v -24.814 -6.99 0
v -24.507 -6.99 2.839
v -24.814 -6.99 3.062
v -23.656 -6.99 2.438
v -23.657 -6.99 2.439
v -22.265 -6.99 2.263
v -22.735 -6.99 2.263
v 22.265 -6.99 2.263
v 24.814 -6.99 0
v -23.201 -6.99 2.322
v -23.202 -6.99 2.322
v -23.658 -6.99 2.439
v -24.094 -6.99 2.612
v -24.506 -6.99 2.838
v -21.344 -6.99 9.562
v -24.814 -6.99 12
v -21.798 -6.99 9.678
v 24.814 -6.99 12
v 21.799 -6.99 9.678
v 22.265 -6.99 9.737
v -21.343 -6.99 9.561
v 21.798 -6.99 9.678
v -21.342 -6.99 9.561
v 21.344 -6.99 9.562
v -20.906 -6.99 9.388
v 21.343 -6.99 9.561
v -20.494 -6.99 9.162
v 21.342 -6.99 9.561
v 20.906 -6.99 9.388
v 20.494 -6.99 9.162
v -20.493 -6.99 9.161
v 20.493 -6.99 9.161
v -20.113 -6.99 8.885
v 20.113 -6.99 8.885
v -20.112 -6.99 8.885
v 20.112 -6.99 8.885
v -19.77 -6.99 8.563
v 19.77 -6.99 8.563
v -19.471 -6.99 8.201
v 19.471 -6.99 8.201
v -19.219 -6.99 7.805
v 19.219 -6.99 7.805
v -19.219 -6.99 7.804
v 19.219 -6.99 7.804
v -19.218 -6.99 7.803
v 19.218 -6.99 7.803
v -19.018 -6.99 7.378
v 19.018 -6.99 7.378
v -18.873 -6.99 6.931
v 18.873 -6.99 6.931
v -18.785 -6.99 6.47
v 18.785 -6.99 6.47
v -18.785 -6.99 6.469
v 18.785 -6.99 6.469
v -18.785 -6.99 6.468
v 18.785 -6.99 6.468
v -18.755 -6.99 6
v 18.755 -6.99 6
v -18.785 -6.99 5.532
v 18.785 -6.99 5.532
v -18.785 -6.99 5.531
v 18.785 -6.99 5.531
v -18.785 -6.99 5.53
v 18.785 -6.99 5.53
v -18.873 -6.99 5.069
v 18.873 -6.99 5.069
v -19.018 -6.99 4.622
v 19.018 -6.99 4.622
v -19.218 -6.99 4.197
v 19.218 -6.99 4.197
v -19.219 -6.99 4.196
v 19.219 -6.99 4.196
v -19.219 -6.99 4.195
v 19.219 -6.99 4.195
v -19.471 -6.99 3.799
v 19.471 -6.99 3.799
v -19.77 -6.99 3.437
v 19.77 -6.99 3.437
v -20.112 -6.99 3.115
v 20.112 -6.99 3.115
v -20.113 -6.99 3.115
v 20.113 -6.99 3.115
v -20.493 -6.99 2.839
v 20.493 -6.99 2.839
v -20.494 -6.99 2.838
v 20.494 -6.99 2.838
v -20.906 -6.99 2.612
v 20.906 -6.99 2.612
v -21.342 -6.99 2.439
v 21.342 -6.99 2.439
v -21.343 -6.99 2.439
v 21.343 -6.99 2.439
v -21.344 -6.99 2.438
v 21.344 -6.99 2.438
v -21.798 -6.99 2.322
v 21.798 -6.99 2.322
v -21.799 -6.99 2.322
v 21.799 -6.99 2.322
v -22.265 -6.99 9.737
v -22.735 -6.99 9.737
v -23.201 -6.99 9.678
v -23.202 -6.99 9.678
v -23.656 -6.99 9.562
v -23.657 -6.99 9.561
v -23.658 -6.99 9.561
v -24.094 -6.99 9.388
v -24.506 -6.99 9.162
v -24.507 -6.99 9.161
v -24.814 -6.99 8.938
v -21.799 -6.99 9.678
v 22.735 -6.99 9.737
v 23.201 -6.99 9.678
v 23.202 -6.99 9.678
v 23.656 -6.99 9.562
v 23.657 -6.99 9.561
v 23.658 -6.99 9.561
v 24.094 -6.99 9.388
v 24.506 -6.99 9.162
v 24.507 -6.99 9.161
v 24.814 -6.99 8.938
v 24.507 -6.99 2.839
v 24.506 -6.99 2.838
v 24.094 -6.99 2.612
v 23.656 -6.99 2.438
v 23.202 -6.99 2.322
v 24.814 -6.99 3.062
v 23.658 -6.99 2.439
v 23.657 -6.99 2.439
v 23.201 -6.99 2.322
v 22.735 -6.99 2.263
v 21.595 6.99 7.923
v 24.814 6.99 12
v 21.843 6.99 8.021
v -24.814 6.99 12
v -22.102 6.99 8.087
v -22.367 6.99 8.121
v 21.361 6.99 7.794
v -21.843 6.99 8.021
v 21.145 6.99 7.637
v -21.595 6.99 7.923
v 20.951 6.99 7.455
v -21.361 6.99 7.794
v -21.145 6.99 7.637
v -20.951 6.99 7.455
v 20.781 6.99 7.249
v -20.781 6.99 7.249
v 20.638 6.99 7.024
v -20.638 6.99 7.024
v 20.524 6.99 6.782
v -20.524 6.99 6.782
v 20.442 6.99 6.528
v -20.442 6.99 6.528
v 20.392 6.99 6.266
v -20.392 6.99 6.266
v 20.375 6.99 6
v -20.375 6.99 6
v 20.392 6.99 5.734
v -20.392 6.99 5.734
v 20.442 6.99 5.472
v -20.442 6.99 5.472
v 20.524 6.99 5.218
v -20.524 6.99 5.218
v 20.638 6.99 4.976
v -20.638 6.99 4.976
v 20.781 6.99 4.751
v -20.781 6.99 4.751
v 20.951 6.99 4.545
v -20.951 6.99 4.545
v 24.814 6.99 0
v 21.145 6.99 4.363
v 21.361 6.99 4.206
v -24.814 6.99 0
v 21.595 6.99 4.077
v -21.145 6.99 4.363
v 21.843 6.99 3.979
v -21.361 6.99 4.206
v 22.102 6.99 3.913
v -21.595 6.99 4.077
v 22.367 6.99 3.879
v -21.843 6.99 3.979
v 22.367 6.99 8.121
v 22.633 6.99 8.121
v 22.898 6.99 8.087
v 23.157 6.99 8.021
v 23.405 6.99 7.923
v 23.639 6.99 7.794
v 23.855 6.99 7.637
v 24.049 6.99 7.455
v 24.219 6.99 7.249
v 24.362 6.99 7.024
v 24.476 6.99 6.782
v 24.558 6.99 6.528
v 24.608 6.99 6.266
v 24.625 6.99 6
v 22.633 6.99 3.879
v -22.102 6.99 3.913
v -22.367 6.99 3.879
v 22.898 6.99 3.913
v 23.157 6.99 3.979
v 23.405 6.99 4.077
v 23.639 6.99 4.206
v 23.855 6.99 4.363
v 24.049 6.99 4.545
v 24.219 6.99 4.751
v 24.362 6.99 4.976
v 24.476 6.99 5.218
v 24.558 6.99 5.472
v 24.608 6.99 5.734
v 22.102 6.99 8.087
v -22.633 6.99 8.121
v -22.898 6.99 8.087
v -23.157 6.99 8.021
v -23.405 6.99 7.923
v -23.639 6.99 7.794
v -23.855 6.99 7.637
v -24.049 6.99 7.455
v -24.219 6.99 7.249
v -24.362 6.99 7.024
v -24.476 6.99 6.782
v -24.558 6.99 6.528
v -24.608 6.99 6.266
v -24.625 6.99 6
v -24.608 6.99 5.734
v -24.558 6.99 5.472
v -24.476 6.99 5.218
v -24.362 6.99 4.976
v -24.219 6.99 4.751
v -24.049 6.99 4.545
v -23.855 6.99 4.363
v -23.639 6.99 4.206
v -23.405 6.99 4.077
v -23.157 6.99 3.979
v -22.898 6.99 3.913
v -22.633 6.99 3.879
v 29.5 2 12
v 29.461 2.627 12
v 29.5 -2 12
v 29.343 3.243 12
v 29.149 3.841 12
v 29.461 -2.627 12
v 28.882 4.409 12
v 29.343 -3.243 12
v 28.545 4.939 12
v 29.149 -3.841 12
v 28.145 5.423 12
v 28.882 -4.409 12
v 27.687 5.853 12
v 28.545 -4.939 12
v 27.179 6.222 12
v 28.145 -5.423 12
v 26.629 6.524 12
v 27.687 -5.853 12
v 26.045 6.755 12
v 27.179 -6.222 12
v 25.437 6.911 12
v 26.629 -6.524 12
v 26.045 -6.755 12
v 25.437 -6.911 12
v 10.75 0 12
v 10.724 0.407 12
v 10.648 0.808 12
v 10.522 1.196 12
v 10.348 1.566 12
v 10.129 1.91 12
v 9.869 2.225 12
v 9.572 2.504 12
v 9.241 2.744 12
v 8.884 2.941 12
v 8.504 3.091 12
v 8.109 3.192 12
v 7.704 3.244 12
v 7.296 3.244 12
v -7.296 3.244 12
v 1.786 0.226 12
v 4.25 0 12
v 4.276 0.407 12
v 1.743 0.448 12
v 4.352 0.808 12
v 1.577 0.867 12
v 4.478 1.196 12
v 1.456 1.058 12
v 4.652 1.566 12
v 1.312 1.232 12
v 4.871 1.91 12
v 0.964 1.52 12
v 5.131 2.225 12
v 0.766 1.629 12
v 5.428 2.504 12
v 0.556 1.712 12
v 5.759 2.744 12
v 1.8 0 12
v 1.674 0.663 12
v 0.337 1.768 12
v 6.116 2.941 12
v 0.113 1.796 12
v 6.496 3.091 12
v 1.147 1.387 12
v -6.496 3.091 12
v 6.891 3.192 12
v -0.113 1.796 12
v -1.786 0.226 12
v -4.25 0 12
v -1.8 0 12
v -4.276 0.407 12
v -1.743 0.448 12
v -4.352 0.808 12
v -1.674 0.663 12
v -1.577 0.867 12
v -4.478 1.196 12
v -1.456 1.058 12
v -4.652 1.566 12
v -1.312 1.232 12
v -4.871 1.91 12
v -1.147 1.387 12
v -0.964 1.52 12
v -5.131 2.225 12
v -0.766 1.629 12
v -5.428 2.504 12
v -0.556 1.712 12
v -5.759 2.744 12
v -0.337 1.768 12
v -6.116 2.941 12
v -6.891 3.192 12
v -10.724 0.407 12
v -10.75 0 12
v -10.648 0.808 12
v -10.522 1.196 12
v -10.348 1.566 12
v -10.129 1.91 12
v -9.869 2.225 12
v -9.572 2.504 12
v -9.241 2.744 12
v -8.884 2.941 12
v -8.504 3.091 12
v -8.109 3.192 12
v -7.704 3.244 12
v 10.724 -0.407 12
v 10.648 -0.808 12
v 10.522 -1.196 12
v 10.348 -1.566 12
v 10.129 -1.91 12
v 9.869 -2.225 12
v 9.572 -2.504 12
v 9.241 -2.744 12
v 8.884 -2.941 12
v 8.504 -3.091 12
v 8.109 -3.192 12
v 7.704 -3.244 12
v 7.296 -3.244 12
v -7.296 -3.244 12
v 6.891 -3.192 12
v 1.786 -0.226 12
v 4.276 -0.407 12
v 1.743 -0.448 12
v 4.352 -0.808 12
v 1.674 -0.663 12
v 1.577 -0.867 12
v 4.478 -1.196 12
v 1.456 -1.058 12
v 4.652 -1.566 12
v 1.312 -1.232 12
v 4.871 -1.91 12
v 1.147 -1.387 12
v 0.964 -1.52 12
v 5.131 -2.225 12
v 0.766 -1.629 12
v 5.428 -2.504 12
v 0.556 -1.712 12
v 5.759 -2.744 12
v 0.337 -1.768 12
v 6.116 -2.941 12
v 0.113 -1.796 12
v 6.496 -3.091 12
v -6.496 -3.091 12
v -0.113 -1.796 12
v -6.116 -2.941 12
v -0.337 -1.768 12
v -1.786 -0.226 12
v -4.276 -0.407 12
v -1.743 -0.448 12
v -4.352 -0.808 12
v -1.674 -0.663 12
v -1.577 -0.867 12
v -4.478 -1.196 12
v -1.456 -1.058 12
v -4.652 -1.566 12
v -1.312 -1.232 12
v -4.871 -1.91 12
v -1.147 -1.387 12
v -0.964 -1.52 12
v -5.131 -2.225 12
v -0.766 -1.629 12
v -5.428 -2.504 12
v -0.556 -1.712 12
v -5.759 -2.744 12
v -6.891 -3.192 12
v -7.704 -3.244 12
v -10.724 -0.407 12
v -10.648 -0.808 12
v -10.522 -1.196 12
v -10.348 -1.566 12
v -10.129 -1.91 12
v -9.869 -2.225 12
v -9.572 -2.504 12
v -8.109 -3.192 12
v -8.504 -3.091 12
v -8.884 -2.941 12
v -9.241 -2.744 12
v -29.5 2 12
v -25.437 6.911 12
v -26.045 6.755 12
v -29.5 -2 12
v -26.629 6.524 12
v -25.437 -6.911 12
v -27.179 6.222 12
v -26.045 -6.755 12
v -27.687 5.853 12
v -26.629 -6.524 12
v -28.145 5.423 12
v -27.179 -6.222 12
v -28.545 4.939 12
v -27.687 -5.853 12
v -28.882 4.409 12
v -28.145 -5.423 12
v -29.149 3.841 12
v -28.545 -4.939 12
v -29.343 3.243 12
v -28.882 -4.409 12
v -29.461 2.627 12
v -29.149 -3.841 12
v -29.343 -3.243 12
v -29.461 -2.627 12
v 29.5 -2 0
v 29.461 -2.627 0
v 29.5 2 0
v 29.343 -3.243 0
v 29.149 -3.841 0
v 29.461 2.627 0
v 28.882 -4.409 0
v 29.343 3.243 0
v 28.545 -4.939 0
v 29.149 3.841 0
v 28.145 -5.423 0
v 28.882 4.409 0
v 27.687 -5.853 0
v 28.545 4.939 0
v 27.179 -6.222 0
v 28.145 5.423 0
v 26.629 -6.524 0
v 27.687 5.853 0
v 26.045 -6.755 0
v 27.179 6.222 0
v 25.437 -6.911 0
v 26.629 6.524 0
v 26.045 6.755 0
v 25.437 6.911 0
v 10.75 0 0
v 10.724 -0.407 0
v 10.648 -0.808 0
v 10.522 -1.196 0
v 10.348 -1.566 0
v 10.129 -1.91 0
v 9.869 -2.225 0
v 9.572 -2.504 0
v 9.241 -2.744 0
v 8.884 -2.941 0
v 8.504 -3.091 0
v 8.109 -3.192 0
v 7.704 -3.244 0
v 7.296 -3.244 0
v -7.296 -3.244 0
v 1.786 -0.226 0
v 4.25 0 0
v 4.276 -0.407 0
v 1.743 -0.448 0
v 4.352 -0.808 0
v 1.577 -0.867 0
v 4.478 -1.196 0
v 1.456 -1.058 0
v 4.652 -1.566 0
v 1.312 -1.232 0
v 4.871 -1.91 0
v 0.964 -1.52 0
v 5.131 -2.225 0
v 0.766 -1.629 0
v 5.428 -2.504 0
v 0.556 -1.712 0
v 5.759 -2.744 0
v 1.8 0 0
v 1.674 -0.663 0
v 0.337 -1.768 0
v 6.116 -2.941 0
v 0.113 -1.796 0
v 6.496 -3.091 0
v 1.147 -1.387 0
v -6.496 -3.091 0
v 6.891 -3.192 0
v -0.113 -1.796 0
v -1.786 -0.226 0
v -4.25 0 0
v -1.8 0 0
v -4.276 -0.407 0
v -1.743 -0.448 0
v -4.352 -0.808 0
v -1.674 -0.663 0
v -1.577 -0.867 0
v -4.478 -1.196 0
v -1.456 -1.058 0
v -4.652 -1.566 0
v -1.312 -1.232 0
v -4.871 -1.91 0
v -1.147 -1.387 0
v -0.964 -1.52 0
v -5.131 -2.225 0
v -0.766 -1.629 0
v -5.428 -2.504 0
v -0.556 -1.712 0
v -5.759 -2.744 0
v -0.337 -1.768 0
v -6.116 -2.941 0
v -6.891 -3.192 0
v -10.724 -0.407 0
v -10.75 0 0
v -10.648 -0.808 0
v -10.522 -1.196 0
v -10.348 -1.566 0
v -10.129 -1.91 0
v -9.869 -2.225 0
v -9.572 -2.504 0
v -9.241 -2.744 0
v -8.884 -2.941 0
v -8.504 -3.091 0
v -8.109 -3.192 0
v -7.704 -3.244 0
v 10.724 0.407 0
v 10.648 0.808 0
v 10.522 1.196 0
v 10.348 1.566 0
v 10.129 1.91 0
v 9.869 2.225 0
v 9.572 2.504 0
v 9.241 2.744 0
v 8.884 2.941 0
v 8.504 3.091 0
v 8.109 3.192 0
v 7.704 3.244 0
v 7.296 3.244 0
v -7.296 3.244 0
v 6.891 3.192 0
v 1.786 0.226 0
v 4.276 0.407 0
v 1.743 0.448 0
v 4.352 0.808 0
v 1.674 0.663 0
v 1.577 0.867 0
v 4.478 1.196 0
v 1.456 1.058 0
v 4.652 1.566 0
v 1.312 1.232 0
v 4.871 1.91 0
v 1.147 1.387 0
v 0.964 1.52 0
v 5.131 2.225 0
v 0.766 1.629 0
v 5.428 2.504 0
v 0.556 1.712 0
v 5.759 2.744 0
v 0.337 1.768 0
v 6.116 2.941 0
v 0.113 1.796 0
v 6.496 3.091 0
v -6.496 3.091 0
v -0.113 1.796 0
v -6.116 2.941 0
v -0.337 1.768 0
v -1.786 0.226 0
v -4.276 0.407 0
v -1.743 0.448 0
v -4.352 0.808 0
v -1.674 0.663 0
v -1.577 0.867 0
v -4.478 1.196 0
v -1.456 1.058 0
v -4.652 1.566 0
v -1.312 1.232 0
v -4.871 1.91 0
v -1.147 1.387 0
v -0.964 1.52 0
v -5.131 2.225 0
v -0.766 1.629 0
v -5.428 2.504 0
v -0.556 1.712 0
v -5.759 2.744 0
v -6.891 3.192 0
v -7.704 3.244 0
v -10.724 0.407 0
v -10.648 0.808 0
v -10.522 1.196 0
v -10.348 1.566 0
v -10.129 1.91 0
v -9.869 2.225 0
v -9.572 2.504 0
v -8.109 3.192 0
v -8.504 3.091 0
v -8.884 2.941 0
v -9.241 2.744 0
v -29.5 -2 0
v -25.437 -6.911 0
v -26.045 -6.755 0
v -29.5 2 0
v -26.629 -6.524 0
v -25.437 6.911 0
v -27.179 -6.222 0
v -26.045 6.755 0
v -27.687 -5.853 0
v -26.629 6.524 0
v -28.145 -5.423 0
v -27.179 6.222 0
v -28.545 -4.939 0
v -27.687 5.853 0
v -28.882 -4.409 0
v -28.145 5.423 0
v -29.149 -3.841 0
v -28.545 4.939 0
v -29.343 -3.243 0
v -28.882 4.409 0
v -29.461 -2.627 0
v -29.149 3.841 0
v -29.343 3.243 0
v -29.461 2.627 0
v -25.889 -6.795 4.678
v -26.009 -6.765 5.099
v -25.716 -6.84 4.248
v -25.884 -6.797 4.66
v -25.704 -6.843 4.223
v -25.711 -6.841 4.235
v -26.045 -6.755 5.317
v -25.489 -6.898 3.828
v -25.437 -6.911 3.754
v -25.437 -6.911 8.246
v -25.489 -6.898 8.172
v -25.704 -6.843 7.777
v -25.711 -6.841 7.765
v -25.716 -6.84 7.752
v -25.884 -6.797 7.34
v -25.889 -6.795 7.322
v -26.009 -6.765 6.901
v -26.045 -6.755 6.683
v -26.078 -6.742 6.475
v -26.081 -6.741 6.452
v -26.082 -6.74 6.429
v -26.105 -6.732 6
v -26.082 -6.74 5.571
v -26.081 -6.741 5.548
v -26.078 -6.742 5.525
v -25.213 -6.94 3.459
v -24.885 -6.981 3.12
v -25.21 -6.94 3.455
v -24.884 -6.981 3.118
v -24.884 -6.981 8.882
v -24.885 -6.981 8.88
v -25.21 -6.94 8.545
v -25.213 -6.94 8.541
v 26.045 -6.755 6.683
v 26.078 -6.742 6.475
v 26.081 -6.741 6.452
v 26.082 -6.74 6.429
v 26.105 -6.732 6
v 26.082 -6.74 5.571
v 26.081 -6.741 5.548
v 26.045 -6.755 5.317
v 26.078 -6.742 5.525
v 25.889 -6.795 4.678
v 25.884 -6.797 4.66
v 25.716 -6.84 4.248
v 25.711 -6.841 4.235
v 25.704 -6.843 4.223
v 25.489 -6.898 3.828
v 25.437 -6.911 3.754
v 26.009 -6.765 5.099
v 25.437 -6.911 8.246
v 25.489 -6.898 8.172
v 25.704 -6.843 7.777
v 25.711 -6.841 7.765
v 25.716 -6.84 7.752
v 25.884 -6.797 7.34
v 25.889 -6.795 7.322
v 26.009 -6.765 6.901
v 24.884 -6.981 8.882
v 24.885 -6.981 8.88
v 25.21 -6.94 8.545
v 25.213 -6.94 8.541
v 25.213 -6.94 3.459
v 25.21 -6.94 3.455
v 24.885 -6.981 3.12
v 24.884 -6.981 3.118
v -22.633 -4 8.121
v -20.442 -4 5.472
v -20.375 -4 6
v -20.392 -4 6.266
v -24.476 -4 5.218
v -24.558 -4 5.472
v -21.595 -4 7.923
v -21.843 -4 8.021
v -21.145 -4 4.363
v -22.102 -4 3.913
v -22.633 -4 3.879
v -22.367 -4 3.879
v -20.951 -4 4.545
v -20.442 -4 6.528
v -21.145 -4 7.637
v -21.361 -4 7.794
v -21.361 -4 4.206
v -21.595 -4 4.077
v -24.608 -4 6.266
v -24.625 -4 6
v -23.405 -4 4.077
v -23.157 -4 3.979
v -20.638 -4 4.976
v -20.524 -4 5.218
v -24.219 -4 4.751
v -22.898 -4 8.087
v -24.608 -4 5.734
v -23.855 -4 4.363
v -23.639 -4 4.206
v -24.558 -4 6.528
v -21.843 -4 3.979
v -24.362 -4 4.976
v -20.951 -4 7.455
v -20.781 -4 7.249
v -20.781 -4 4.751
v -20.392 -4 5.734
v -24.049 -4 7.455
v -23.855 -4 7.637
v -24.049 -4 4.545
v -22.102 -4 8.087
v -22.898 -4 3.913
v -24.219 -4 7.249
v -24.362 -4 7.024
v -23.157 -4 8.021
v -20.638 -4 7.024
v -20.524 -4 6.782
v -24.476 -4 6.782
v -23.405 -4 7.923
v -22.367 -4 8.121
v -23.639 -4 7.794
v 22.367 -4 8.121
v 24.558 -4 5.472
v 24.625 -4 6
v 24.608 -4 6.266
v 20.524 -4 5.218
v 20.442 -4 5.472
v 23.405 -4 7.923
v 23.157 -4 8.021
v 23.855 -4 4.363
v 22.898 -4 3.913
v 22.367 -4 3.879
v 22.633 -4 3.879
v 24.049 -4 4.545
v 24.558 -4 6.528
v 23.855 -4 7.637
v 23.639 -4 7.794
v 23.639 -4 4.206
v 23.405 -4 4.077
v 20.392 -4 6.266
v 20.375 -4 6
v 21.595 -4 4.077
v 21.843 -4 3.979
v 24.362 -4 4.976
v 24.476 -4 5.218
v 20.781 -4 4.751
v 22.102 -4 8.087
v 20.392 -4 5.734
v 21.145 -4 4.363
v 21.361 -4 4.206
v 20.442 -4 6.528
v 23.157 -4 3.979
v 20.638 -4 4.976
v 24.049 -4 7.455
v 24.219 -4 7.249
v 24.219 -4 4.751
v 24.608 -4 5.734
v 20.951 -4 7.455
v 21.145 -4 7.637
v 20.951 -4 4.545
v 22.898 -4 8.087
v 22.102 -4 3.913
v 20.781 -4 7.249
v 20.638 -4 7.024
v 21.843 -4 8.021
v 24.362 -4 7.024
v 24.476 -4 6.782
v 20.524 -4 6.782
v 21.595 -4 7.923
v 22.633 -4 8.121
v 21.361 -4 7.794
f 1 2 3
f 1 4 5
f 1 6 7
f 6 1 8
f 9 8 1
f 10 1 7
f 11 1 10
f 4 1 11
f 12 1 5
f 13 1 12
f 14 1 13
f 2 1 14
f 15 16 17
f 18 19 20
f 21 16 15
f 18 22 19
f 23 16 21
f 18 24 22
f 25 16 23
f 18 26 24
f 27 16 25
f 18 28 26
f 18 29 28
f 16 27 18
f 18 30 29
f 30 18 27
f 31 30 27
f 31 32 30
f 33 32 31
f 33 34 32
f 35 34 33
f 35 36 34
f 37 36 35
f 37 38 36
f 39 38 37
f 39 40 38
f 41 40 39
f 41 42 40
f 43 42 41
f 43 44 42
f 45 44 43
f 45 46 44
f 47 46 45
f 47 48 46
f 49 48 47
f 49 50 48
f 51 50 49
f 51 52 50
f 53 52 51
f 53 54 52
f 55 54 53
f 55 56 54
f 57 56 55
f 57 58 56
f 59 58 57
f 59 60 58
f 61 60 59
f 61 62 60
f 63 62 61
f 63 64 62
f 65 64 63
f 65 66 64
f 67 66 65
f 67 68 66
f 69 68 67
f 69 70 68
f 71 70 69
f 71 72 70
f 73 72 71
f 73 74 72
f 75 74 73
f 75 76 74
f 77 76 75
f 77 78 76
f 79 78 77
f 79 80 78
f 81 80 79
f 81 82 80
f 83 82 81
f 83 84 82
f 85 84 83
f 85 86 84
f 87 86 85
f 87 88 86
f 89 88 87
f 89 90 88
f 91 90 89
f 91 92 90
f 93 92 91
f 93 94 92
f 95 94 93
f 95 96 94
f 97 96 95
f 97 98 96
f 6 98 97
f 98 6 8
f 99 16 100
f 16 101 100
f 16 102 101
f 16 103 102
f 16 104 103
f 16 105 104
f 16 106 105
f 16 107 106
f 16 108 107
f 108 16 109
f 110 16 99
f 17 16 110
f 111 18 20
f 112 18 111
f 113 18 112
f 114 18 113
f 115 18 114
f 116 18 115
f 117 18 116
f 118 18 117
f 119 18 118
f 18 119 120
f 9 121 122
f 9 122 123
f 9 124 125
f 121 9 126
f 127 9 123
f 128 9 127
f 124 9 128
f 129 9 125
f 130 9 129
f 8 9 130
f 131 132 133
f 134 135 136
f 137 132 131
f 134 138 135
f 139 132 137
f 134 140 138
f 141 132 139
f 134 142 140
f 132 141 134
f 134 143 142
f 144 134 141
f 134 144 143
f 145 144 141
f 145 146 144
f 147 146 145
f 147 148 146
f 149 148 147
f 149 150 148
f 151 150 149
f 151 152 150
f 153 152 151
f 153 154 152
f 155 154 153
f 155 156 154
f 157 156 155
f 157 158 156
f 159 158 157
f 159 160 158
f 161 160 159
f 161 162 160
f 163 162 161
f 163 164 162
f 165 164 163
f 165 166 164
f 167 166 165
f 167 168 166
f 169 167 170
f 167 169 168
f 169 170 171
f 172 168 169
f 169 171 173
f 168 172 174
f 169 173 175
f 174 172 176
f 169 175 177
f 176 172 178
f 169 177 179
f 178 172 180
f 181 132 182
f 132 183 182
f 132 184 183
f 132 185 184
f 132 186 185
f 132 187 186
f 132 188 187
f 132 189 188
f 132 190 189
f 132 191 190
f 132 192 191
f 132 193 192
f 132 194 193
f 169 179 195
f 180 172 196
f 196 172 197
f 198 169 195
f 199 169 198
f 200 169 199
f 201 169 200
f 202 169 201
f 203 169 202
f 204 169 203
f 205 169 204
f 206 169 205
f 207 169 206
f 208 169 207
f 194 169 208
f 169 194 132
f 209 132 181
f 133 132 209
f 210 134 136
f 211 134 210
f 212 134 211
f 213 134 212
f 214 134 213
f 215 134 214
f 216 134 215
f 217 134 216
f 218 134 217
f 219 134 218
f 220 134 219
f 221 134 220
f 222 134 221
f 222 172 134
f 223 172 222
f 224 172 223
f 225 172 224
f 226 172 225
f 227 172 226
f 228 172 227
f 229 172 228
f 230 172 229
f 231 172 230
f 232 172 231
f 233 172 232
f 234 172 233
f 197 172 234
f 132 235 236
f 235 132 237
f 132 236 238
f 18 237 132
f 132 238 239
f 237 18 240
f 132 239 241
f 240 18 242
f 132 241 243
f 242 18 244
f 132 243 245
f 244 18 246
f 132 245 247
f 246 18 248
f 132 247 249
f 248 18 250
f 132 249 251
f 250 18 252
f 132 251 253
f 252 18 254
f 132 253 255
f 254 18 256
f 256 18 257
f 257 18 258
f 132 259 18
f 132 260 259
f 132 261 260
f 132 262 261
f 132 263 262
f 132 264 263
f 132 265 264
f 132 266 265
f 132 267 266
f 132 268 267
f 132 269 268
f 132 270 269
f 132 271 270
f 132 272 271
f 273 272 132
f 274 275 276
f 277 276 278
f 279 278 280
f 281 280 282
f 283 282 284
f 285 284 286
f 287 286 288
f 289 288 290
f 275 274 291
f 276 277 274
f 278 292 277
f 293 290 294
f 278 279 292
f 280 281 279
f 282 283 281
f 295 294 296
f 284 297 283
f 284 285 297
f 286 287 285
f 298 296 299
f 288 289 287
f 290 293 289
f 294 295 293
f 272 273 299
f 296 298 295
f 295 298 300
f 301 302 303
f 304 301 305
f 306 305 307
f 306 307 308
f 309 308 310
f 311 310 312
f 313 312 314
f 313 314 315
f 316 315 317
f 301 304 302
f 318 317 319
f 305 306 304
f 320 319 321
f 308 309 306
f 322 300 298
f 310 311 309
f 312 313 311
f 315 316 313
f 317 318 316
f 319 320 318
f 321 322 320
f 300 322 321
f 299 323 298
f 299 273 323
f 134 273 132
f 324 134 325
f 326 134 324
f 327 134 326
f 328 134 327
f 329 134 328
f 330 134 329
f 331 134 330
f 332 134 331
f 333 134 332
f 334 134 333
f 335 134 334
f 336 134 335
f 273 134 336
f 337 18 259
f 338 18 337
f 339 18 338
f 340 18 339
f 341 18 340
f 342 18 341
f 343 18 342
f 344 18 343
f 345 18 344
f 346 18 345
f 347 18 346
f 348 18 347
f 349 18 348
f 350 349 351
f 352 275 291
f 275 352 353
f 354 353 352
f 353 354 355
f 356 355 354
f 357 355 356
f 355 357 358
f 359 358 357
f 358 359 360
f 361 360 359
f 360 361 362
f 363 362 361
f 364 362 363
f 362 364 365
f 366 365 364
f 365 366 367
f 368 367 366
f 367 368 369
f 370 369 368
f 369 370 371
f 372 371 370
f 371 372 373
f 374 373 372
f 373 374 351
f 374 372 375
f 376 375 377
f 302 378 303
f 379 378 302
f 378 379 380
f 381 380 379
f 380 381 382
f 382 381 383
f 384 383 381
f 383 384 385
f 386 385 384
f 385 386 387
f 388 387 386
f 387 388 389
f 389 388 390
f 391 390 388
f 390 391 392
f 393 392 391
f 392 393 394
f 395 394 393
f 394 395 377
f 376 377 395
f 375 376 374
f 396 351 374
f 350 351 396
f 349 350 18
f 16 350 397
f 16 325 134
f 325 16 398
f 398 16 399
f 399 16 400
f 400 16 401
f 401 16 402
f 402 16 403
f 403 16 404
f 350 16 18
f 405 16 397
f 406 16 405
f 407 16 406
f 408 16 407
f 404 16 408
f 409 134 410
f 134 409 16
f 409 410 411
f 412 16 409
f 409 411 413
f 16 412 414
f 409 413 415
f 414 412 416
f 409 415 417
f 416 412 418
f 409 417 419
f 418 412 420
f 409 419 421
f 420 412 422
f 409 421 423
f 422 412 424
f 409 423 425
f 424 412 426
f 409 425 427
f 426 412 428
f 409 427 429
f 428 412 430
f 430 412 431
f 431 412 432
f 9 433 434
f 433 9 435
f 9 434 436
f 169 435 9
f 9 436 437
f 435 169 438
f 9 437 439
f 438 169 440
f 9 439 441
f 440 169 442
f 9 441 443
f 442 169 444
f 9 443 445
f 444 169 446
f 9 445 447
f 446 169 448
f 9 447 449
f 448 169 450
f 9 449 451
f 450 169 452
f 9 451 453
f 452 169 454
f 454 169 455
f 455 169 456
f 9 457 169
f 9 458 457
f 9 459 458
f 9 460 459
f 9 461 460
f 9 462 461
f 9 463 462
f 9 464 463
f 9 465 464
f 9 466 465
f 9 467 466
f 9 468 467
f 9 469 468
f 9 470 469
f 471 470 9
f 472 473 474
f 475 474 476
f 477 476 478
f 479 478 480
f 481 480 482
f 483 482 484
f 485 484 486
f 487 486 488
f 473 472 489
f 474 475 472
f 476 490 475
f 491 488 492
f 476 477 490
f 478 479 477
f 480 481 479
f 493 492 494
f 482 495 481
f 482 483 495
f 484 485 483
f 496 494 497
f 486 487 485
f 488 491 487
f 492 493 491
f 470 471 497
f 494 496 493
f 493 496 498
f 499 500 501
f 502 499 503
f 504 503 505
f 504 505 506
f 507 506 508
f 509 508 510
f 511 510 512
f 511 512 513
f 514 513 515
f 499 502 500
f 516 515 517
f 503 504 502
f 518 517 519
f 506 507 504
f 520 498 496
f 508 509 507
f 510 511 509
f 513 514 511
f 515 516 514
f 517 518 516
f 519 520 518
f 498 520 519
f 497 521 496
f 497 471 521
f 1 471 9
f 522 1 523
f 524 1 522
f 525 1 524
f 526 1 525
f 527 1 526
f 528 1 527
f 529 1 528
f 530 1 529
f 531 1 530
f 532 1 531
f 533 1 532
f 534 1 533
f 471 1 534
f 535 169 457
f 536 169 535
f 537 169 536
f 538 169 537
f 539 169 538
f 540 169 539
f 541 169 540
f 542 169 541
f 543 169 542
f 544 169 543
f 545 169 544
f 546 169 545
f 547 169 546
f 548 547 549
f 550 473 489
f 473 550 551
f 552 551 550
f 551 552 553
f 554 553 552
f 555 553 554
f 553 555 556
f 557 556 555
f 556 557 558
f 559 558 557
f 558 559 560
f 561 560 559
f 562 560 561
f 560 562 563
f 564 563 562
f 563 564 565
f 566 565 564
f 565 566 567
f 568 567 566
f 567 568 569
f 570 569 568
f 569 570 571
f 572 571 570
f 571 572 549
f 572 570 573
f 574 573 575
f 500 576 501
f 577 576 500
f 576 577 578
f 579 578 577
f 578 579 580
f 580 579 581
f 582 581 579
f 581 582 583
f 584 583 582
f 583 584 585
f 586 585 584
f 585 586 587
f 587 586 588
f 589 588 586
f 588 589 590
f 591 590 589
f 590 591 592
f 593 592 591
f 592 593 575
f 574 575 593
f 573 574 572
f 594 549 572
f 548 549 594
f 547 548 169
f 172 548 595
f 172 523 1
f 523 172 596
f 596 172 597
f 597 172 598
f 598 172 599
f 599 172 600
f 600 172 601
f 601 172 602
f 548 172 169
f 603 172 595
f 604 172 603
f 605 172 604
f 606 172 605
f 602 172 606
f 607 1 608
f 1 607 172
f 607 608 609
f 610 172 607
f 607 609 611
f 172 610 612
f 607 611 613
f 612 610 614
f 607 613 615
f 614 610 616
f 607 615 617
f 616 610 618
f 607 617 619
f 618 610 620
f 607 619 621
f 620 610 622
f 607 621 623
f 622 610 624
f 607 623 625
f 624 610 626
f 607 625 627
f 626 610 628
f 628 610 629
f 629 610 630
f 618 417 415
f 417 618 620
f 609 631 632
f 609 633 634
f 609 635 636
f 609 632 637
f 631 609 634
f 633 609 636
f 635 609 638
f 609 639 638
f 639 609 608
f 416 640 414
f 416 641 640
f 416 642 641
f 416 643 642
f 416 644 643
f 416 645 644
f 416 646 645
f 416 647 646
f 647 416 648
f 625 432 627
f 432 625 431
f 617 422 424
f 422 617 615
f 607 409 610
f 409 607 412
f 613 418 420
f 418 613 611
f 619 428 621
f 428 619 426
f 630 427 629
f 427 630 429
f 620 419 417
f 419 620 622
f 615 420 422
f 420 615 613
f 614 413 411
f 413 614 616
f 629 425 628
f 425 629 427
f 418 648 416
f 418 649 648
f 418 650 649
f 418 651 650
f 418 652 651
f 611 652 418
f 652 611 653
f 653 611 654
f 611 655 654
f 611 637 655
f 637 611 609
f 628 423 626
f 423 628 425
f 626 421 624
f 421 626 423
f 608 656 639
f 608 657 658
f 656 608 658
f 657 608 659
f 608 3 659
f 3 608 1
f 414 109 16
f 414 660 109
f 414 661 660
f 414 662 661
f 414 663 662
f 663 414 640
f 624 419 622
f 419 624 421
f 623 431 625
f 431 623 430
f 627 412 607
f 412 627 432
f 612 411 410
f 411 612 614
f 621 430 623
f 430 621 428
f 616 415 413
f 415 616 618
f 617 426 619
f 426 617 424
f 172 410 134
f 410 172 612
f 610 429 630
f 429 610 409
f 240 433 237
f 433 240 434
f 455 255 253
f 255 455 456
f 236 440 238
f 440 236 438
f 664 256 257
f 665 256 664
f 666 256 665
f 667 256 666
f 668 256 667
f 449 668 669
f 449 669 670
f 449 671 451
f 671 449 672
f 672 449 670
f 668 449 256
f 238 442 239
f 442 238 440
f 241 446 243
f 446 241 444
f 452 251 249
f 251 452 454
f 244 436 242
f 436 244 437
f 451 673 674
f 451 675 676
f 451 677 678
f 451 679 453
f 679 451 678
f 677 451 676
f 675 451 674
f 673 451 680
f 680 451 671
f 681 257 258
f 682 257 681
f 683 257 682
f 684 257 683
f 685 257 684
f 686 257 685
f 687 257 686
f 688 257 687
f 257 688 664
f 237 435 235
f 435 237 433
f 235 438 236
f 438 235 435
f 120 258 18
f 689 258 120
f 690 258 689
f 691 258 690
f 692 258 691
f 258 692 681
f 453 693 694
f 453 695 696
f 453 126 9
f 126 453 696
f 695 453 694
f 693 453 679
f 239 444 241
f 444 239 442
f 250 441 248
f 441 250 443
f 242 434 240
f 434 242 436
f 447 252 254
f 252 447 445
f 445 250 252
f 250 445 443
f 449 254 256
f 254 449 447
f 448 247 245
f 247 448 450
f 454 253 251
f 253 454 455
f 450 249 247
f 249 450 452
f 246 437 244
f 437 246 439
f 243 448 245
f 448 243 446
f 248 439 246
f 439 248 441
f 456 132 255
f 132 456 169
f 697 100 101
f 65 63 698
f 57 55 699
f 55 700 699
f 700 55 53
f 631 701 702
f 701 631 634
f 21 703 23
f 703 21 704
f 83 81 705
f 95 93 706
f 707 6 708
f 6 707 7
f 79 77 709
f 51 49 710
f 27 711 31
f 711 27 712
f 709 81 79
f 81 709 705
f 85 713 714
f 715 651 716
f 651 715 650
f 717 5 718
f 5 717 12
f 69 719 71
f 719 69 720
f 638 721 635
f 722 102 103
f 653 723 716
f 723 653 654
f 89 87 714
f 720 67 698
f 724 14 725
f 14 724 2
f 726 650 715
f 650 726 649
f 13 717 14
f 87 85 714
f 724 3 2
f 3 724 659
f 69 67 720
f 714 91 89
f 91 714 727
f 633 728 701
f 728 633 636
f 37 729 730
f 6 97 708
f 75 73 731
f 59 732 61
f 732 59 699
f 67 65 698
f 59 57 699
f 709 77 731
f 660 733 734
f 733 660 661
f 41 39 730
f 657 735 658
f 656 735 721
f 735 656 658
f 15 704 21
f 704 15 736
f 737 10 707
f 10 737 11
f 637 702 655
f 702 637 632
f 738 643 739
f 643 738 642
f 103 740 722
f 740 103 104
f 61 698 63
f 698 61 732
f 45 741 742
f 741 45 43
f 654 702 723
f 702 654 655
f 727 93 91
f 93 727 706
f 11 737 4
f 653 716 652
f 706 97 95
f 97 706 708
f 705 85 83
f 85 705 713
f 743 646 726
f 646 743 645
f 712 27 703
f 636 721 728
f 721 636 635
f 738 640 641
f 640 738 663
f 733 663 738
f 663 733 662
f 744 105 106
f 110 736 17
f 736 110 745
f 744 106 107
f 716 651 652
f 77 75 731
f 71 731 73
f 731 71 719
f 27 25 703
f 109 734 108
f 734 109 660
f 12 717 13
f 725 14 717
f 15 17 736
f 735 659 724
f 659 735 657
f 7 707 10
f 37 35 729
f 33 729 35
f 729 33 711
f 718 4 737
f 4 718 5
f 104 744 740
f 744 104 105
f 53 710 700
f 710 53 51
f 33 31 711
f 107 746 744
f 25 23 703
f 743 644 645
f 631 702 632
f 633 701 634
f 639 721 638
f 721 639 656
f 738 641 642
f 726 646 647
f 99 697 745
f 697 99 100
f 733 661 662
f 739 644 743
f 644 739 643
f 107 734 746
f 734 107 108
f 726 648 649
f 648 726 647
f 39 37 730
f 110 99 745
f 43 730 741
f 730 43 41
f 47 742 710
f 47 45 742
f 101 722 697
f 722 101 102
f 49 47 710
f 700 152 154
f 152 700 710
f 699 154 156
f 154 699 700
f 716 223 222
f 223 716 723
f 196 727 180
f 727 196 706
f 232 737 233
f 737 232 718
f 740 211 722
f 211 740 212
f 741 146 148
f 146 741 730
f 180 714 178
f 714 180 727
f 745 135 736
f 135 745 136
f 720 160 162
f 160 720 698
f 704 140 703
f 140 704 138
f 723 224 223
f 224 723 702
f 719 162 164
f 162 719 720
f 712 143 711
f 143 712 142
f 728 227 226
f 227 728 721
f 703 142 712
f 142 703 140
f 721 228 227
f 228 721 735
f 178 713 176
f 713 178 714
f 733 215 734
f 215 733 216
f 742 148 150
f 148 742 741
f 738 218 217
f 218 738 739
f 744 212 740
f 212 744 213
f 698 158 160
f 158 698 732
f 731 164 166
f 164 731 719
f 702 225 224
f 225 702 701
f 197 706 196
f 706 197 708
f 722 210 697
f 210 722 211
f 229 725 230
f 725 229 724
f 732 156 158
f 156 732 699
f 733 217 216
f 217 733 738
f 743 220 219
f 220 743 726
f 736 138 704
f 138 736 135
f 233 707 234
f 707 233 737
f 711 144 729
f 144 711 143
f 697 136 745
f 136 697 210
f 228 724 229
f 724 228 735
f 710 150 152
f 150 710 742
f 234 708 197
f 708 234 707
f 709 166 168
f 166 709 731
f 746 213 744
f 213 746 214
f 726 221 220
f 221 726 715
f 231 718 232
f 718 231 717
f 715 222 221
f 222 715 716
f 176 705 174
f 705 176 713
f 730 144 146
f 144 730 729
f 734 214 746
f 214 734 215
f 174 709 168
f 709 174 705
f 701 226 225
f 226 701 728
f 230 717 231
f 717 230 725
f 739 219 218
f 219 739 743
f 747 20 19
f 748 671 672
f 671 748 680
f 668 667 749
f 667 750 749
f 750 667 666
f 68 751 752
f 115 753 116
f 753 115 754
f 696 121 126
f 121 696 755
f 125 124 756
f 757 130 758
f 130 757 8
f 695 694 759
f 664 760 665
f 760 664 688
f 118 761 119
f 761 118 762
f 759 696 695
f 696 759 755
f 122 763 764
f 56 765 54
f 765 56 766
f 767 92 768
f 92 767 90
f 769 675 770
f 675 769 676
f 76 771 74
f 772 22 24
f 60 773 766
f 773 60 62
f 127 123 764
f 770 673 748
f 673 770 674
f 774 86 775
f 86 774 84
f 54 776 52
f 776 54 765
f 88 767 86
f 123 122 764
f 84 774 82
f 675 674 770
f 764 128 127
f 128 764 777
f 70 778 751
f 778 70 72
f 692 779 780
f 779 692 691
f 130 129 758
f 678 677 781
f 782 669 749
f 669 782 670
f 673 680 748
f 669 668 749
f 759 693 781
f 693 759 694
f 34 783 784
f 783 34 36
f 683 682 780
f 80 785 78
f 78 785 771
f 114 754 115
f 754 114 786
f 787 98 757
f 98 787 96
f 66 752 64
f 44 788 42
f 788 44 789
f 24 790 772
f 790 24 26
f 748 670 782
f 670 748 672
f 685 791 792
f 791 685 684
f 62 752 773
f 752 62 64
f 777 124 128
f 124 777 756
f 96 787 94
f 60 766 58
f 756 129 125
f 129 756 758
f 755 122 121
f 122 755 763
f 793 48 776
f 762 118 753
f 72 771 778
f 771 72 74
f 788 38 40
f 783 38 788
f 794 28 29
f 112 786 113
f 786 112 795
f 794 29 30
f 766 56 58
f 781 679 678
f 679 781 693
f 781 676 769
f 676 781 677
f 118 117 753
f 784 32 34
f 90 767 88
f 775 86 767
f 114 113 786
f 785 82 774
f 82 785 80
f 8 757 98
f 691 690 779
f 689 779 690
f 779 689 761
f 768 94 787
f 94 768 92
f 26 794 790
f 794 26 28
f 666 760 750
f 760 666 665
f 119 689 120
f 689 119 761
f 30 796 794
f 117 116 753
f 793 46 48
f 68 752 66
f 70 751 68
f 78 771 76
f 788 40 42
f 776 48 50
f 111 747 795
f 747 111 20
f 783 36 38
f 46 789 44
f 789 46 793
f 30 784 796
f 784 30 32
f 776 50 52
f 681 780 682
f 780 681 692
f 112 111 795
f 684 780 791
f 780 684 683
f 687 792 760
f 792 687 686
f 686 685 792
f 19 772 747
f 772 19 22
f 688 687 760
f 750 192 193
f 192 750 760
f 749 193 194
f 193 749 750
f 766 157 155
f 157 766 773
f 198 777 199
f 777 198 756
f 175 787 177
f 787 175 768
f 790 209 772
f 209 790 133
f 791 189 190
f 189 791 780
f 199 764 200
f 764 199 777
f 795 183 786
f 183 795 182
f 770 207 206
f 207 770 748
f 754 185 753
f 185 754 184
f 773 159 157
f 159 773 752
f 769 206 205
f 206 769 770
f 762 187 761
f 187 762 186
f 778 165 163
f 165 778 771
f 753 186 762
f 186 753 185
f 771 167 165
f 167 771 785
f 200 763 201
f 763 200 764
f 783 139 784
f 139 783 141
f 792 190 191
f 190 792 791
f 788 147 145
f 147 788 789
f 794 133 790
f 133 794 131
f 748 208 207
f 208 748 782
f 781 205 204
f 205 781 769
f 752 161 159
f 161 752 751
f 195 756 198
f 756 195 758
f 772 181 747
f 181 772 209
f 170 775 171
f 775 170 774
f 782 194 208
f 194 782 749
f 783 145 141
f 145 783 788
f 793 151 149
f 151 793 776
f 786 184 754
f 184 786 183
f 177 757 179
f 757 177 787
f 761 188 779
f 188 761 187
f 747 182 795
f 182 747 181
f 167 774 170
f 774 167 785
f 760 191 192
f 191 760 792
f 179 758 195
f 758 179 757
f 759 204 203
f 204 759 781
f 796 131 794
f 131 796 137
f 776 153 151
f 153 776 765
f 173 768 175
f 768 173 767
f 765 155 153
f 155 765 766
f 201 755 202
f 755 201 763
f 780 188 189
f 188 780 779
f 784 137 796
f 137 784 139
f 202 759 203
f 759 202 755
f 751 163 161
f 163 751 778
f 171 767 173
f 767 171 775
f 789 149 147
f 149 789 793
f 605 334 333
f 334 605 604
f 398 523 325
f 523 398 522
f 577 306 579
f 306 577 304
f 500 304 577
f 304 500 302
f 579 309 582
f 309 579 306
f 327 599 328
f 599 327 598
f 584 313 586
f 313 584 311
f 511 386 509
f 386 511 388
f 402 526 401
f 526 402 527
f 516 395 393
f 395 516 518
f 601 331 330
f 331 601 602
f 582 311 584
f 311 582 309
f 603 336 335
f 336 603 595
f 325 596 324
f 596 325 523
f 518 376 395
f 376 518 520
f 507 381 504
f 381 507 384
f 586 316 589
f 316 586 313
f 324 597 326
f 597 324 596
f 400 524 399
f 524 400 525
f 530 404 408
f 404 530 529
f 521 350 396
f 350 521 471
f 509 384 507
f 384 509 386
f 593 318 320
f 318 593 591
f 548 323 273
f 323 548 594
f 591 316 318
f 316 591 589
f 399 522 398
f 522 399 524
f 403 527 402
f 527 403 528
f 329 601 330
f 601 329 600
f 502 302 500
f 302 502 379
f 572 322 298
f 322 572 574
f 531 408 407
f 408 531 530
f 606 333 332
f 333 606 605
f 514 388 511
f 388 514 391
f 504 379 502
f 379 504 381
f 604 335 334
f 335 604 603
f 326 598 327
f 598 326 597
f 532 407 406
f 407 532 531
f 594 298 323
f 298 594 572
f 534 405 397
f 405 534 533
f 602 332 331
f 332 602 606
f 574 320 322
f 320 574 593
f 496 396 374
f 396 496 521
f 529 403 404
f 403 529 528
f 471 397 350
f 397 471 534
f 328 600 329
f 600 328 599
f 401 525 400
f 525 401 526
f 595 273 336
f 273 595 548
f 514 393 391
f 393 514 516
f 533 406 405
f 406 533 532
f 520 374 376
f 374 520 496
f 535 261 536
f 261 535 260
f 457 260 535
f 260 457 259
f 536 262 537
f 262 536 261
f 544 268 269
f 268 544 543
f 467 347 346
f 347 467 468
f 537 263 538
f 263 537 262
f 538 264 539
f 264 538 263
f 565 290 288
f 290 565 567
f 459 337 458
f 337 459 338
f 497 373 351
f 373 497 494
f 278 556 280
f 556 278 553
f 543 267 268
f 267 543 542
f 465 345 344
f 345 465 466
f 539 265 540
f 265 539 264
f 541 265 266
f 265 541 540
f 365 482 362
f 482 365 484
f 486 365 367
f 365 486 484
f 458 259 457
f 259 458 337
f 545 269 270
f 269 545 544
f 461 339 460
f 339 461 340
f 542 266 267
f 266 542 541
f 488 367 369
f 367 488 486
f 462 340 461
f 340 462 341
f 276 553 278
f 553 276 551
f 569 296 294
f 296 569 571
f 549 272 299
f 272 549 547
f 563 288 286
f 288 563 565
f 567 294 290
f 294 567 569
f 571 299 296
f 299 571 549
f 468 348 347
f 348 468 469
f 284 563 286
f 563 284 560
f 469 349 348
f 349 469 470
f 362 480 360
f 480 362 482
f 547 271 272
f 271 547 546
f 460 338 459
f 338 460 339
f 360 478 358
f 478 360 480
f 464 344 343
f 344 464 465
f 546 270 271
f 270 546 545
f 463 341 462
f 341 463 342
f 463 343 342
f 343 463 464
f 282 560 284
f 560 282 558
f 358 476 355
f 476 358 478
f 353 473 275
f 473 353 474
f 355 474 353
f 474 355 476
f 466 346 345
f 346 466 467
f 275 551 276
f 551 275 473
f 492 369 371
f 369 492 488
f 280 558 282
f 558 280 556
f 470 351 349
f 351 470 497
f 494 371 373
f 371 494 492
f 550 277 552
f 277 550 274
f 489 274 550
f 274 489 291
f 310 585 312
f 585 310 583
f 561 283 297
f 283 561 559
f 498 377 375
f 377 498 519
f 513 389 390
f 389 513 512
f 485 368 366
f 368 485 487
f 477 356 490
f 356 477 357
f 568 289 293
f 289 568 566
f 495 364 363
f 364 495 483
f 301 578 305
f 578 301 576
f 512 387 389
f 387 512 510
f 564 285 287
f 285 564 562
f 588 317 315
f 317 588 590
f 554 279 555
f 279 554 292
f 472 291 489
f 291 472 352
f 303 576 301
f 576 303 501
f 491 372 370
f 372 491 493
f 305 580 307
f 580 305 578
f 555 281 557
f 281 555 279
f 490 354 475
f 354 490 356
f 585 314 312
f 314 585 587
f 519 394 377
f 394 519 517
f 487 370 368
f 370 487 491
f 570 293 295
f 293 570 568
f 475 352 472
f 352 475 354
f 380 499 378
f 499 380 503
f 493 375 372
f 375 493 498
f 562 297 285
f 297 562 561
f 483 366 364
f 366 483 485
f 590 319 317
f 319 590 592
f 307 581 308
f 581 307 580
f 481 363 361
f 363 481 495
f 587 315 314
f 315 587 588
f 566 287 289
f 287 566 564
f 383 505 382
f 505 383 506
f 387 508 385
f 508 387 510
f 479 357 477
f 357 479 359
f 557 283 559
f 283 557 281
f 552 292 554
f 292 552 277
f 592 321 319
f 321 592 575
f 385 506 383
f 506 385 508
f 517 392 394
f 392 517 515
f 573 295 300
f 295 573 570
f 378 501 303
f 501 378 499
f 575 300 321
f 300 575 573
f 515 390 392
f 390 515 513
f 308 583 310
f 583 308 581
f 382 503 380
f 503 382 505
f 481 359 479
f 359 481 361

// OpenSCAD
$fn = 50;


difference() {
	union() {
		hull() {
			translate(v = [-9.5000000000, 2.0000000000, 0]) {
				cylinder(h = 12, r = 5);
			}
			translate(v = [9.5000000000, 2.0000000000, 0]) {
				cylinder(h = 12, r = 5);
			}
			translate(v = [-9.5000000000, -2.0000000000, 0]) {
				cylinder(h = 12, r = 5);
			}
			translate(v = [9.5000000000, -2.0000000000, 0]) {
				cylinder(h = 12, r = 5);
			}
		}
		translate(v = [-15.0000000000, 0.0000000000, 0]) {
			hull() {
				translate(v = [-9.5000000000, 2.0000000000, 0]) {
					cylinder(h = 12, r = 5);
				}
				translate(v = [9.5000000000, 2.0000000000, 0]) {
					cylinder(h = 12, r = 5);
				}
				translate(v = [-9.5000000000, -2.0000000000, 0]) {
					cylinder(h = 12, r = 5);
				}
				translate(v = [9.5000000000, -2.0000000000, 0]) {
					cylinder(h = 12, r = 5);
				}
			}
		}
		translate(v = [15.0000000000, 0.0000000000, 0]) {
			hull() {
				translate(v = [-9.5000000000, 2.0000000000, 0]) {
					cylinder(h = 12, r = 5);
				}
				translate(v = [9.5000000000, 2.0000000000, 0]) {
					cylinder(h = 12, r = 5);
				}
				translate(v = [-9.5000000000, -2.0000000000, 0]) {
					cylinder(h = 12, r = 5);
				}
				translate(v = [9.5000000000, -2.0000000000, 0]) {
					cylinder(h = 12, r = 5);
				}
			}
		}
	}
	union() {
		translate(v = [-22.5000000000, -7.0000000000, 6.0000000000]) {
			rotate(a = [90, 0, 0]) {
				difference() {
					union() {
						#translate(v = [0, 0, -14.0000000000]) {
							cylinder(h = 14, r = 2.0000000000);
						}
						#translate(v = [0, 0, -3]) {
							cylinder(h = 3, r1 = 2.1250000000, r2 = 3.7500000000);
						}
						#translate(v = [0, 0, -14.0000000000]) {
							cylinder(h = 14, r = 2.1250000000);
						}
						#translate(v = [0, 0, -14.0000000000]) {
							cylinder(h = 14, r = 2.0000000000);
						}
					}
					union();
				}
			}
		}
		translate(v = [22.5000000000, -7.0000000000, 6.0000000000]) {
			rotate(a = [90, 0, 0]) {
				difference() {
					union() {
						#translate(v = [0, 0, -14.0000000000]) {
							cylinder(h = 14, r = 2.0000000000);
						}
						#translate(v = [0, 0, -3]) {
							cylinder(h = 3, r1 = 2.1250000000, r2 = 3.7500000000);
						}
						#translate(v = [0, 0, -14.0000000000]) {
							cylinder(h = 14, r = 2.1250000000);
						}
						#translate(v = [0, 0, -14.0000000000]) {
							cylinder(h = 14, r = 2.0000000000);
						}
					}
					union();
				}
			}
		}
		translate(v = [-7.5000000000, 0.0000000000, 0]) {
			translate(v = [0, 0, -100]) {
				cylinder(h = 200, r = 3.2500000000);
			}
		}
		translate(v = [7.5000000000, 0.0000000000, 0]) {
			translate(v = [0, 0, -100]) {
				cylinder(h = 200, r = 3.2500000000);
			}
		}
		translate(v = [-7.5000000000, 0.0000000000, 0]) {
			translate(v = [0, 0, -100]) {
				cylinder(h = 200, r = 1.8000000000);
			}
		}
		translate(v = [0, 0, -100]) {
			cylinder(h = 200, r = 1.8000000000);
		}
		translate(v = [7.5000000000, 0.0000000000, 0]) {
			translate(v = [0, 0, -100]) {
				cylinder(h = 200, r = 1.8000000000);
			}
		}
	}
}
